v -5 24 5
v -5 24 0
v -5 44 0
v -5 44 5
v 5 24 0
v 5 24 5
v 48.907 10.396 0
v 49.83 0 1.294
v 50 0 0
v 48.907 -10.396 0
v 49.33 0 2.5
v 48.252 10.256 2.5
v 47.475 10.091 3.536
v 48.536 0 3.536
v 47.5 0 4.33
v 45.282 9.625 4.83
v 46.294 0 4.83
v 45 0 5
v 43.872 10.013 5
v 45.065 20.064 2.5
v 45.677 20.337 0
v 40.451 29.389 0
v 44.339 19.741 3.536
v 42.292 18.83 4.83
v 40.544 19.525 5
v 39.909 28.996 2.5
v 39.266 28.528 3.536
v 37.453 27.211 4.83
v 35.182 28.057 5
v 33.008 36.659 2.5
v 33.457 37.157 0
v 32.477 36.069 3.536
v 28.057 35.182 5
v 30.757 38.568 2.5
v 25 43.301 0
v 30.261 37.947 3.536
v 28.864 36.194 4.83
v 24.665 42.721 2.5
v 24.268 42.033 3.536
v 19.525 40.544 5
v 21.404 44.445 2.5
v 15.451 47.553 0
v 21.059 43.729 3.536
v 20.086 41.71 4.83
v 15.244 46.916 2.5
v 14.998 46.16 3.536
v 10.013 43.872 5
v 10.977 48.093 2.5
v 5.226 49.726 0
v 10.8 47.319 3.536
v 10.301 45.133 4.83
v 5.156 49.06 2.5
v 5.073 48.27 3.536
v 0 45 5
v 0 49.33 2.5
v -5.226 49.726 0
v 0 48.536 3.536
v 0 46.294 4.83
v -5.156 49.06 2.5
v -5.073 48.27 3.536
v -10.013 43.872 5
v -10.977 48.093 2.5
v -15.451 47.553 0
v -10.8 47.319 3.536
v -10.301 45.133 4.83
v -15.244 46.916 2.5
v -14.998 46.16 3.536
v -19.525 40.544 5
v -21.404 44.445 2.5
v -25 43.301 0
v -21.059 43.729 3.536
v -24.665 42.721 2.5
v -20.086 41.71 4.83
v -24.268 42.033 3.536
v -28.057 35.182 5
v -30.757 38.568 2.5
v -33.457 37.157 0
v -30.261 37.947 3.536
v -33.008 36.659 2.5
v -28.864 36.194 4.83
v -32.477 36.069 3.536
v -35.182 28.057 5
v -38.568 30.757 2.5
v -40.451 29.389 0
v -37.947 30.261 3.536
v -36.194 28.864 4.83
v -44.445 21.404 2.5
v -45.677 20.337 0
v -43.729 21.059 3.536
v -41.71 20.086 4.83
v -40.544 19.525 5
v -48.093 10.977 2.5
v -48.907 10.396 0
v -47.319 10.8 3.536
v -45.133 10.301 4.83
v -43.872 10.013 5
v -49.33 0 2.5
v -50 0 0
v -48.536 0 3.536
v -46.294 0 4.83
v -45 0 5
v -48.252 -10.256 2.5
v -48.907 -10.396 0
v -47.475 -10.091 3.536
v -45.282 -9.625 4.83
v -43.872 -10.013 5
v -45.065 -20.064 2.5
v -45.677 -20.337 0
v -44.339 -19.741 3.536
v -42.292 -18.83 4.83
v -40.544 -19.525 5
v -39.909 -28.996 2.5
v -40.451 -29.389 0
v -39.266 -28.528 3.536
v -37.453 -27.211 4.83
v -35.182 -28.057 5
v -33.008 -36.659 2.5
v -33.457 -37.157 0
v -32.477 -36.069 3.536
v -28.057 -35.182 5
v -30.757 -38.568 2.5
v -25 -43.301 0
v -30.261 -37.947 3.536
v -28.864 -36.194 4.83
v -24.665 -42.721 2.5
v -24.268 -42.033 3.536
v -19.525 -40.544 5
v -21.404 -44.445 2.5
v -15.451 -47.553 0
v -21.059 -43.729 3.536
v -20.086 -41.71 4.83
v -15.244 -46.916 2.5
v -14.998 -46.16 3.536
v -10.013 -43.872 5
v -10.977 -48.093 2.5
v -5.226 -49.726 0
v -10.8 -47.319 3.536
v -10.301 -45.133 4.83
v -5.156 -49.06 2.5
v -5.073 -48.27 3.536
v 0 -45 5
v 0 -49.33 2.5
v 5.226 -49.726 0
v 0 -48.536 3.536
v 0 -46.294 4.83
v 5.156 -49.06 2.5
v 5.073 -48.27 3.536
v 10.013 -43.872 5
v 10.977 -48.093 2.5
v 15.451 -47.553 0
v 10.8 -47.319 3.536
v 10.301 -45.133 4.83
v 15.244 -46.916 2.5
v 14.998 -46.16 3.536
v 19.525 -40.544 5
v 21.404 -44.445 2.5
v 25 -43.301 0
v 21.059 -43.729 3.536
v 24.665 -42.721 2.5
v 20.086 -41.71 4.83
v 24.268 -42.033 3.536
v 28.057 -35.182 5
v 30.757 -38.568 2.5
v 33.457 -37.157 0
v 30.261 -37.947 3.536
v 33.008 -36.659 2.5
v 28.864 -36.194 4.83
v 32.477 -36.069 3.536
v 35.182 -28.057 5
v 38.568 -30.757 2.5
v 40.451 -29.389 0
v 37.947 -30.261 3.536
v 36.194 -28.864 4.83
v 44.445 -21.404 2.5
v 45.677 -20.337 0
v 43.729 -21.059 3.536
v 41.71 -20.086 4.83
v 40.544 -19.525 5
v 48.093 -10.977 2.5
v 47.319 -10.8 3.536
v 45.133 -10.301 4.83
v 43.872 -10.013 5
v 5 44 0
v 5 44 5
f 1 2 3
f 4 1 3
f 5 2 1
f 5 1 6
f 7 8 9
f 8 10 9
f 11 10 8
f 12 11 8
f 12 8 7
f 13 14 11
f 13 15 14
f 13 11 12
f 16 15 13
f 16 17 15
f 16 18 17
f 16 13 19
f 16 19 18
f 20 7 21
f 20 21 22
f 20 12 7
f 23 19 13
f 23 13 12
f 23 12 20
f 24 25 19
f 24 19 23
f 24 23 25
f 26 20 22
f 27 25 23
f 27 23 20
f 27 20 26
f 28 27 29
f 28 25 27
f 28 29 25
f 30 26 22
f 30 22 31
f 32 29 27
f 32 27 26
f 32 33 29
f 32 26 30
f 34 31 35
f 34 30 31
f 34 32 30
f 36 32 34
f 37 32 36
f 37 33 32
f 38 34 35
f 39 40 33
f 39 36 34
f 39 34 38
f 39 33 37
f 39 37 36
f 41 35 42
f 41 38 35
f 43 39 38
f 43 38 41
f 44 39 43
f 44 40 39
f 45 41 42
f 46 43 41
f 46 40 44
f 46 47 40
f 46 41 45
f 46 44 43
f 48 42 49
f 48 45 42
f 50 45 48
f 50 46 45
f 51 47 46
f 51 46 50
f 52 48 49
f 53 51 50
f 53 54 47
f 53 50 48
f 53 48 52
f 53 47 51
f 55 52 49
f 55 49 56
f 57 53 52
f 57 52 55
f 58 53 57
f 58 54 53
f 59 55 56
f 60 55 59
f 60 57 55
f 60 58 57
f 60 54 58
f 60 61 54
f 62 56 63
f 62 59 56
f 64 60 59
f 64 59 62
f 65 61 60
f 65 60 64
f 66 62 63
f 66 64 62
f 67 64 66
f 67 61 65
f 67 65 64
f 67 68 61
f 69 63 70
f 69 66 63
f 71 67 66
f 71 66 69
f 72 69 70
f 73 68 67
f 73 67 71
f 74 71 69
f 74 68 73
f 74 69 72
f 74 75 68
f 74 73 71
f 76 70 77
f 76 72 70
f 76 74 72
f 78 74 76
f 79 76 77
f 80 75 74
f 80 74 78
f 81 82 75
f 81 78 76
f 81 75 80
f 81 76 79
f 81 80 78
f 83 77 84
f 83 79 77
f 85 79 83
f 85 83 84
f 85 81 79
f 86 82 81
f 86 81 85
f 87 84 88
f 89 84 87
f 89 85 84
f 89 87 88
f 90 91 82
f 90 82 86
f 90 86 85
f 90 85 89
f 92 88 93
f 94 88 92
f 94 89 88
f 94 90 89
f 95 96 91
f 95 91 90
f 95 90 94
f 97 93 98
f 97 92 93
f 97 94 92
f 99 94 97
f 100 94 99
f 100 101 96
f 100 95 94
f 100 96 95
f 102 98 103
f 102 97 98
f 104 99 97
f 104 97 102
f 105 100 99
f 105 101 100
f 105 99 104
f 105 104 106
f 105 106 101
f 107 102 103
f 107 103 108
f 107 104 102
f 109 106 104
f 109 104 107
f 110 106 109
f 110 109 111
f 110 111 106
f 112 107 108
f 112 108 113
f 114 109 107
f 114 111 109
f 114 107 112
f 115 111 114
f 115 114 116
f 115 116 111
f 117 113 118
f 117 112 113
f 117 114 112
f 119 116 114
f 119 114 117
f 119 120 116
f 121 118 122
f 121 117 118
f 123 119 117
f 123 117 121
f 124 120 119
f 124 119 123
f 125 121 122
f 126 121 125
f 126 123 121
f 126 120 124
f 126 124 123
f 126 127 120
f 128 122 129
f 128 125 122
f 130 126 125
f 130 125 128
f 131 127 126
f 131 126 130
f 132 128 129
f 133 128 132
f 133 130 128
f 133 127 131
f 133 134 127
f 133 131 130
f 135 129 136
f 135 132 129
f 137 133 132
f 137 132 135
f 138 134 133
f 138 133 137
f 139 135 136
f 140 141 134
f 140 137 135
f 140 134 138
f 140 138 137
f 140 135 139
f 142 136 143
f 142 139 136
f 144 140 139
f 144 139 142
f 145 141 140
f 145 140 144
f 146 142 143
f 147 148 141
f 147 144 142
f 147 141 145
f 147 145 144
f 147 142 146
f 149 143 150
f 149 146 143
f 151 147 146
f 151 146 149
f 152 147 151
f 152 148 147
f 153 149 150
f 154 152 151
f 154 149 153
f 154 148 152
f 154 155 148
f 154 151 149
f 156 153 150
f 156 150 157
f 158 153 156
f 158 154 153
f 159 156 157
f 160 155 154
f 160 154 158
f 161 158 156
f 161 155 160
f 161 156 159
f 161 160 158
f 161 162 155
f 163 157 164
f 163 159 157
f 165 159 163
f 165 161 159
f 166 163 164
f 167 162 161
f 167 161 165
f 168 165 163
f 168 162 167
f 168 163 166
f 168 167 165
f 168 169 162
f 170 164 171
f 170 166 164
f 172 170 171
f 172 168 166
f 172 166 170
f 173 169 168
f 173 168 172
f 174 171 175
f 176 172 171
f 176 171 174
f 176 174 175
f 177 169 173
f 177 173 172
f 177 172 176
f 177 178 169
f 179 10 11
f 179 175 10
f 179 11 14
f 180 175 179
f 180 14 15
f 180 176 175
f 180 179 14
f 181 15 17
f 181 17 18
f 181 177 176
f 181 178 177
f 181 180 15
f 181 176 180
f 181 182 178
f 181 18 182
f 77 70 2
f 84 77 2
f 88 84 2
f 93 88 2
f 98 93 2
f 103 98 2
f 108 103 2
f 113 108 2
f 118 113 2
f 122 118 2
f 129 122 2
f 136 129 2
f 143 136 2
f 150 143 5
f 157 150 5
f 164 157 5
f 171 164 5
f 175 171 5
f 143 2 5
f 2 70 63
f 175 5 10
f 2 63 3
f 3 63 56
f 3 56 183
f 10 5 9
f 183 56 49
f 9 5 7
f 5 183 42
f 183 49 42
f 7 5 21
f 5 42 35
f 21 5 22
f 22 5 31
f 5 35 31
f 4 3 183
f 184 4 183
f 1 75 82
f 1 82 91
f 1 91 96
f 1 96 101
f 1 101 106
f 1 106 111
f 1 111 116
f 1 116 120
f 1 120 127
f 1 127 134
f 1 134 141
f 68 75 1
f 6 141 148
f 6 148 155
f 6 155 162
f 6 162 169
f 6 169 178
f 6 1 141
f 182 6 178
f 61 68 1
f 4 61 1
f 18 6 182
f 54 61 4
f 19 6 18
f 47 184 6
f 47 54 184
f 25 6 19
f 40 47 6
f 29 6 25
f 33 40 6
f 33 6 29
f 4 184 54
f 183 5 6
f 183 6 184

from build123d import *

# Parameters (mm, degrees)
F0_R     = 50
F0_W     = 10
F0_H     = 20
F1_DEPTH = 5
F2_R     = 4.99999


# Not quite as in the source:
# - a fillet or chamfer is up to 0.001 mm smaller than in the source, because OpenCascade refuses the exact size


with BuildPart() as f1:
    # F0 (on Top) → F1 (new body)
    with BuildSketch(Plane.XY):
        Circle(F0_R)
        with Locations((0, 34)):
            Rectangle(F0_W, F0_H, mode=Mode.SUBTRACT)
    extrude(amount=F1_DEPTH)

    # F2 (radius 5 in the source; OpenCascade refuses exactly that, so slightly less here)
    f2_edges = [f1.edges().sort_by_distance(p)[0] for p in [
        (-50, 0, 5),
    ]]
    fillet(f2_edges, radius=F2_R)


solid = f1.part
